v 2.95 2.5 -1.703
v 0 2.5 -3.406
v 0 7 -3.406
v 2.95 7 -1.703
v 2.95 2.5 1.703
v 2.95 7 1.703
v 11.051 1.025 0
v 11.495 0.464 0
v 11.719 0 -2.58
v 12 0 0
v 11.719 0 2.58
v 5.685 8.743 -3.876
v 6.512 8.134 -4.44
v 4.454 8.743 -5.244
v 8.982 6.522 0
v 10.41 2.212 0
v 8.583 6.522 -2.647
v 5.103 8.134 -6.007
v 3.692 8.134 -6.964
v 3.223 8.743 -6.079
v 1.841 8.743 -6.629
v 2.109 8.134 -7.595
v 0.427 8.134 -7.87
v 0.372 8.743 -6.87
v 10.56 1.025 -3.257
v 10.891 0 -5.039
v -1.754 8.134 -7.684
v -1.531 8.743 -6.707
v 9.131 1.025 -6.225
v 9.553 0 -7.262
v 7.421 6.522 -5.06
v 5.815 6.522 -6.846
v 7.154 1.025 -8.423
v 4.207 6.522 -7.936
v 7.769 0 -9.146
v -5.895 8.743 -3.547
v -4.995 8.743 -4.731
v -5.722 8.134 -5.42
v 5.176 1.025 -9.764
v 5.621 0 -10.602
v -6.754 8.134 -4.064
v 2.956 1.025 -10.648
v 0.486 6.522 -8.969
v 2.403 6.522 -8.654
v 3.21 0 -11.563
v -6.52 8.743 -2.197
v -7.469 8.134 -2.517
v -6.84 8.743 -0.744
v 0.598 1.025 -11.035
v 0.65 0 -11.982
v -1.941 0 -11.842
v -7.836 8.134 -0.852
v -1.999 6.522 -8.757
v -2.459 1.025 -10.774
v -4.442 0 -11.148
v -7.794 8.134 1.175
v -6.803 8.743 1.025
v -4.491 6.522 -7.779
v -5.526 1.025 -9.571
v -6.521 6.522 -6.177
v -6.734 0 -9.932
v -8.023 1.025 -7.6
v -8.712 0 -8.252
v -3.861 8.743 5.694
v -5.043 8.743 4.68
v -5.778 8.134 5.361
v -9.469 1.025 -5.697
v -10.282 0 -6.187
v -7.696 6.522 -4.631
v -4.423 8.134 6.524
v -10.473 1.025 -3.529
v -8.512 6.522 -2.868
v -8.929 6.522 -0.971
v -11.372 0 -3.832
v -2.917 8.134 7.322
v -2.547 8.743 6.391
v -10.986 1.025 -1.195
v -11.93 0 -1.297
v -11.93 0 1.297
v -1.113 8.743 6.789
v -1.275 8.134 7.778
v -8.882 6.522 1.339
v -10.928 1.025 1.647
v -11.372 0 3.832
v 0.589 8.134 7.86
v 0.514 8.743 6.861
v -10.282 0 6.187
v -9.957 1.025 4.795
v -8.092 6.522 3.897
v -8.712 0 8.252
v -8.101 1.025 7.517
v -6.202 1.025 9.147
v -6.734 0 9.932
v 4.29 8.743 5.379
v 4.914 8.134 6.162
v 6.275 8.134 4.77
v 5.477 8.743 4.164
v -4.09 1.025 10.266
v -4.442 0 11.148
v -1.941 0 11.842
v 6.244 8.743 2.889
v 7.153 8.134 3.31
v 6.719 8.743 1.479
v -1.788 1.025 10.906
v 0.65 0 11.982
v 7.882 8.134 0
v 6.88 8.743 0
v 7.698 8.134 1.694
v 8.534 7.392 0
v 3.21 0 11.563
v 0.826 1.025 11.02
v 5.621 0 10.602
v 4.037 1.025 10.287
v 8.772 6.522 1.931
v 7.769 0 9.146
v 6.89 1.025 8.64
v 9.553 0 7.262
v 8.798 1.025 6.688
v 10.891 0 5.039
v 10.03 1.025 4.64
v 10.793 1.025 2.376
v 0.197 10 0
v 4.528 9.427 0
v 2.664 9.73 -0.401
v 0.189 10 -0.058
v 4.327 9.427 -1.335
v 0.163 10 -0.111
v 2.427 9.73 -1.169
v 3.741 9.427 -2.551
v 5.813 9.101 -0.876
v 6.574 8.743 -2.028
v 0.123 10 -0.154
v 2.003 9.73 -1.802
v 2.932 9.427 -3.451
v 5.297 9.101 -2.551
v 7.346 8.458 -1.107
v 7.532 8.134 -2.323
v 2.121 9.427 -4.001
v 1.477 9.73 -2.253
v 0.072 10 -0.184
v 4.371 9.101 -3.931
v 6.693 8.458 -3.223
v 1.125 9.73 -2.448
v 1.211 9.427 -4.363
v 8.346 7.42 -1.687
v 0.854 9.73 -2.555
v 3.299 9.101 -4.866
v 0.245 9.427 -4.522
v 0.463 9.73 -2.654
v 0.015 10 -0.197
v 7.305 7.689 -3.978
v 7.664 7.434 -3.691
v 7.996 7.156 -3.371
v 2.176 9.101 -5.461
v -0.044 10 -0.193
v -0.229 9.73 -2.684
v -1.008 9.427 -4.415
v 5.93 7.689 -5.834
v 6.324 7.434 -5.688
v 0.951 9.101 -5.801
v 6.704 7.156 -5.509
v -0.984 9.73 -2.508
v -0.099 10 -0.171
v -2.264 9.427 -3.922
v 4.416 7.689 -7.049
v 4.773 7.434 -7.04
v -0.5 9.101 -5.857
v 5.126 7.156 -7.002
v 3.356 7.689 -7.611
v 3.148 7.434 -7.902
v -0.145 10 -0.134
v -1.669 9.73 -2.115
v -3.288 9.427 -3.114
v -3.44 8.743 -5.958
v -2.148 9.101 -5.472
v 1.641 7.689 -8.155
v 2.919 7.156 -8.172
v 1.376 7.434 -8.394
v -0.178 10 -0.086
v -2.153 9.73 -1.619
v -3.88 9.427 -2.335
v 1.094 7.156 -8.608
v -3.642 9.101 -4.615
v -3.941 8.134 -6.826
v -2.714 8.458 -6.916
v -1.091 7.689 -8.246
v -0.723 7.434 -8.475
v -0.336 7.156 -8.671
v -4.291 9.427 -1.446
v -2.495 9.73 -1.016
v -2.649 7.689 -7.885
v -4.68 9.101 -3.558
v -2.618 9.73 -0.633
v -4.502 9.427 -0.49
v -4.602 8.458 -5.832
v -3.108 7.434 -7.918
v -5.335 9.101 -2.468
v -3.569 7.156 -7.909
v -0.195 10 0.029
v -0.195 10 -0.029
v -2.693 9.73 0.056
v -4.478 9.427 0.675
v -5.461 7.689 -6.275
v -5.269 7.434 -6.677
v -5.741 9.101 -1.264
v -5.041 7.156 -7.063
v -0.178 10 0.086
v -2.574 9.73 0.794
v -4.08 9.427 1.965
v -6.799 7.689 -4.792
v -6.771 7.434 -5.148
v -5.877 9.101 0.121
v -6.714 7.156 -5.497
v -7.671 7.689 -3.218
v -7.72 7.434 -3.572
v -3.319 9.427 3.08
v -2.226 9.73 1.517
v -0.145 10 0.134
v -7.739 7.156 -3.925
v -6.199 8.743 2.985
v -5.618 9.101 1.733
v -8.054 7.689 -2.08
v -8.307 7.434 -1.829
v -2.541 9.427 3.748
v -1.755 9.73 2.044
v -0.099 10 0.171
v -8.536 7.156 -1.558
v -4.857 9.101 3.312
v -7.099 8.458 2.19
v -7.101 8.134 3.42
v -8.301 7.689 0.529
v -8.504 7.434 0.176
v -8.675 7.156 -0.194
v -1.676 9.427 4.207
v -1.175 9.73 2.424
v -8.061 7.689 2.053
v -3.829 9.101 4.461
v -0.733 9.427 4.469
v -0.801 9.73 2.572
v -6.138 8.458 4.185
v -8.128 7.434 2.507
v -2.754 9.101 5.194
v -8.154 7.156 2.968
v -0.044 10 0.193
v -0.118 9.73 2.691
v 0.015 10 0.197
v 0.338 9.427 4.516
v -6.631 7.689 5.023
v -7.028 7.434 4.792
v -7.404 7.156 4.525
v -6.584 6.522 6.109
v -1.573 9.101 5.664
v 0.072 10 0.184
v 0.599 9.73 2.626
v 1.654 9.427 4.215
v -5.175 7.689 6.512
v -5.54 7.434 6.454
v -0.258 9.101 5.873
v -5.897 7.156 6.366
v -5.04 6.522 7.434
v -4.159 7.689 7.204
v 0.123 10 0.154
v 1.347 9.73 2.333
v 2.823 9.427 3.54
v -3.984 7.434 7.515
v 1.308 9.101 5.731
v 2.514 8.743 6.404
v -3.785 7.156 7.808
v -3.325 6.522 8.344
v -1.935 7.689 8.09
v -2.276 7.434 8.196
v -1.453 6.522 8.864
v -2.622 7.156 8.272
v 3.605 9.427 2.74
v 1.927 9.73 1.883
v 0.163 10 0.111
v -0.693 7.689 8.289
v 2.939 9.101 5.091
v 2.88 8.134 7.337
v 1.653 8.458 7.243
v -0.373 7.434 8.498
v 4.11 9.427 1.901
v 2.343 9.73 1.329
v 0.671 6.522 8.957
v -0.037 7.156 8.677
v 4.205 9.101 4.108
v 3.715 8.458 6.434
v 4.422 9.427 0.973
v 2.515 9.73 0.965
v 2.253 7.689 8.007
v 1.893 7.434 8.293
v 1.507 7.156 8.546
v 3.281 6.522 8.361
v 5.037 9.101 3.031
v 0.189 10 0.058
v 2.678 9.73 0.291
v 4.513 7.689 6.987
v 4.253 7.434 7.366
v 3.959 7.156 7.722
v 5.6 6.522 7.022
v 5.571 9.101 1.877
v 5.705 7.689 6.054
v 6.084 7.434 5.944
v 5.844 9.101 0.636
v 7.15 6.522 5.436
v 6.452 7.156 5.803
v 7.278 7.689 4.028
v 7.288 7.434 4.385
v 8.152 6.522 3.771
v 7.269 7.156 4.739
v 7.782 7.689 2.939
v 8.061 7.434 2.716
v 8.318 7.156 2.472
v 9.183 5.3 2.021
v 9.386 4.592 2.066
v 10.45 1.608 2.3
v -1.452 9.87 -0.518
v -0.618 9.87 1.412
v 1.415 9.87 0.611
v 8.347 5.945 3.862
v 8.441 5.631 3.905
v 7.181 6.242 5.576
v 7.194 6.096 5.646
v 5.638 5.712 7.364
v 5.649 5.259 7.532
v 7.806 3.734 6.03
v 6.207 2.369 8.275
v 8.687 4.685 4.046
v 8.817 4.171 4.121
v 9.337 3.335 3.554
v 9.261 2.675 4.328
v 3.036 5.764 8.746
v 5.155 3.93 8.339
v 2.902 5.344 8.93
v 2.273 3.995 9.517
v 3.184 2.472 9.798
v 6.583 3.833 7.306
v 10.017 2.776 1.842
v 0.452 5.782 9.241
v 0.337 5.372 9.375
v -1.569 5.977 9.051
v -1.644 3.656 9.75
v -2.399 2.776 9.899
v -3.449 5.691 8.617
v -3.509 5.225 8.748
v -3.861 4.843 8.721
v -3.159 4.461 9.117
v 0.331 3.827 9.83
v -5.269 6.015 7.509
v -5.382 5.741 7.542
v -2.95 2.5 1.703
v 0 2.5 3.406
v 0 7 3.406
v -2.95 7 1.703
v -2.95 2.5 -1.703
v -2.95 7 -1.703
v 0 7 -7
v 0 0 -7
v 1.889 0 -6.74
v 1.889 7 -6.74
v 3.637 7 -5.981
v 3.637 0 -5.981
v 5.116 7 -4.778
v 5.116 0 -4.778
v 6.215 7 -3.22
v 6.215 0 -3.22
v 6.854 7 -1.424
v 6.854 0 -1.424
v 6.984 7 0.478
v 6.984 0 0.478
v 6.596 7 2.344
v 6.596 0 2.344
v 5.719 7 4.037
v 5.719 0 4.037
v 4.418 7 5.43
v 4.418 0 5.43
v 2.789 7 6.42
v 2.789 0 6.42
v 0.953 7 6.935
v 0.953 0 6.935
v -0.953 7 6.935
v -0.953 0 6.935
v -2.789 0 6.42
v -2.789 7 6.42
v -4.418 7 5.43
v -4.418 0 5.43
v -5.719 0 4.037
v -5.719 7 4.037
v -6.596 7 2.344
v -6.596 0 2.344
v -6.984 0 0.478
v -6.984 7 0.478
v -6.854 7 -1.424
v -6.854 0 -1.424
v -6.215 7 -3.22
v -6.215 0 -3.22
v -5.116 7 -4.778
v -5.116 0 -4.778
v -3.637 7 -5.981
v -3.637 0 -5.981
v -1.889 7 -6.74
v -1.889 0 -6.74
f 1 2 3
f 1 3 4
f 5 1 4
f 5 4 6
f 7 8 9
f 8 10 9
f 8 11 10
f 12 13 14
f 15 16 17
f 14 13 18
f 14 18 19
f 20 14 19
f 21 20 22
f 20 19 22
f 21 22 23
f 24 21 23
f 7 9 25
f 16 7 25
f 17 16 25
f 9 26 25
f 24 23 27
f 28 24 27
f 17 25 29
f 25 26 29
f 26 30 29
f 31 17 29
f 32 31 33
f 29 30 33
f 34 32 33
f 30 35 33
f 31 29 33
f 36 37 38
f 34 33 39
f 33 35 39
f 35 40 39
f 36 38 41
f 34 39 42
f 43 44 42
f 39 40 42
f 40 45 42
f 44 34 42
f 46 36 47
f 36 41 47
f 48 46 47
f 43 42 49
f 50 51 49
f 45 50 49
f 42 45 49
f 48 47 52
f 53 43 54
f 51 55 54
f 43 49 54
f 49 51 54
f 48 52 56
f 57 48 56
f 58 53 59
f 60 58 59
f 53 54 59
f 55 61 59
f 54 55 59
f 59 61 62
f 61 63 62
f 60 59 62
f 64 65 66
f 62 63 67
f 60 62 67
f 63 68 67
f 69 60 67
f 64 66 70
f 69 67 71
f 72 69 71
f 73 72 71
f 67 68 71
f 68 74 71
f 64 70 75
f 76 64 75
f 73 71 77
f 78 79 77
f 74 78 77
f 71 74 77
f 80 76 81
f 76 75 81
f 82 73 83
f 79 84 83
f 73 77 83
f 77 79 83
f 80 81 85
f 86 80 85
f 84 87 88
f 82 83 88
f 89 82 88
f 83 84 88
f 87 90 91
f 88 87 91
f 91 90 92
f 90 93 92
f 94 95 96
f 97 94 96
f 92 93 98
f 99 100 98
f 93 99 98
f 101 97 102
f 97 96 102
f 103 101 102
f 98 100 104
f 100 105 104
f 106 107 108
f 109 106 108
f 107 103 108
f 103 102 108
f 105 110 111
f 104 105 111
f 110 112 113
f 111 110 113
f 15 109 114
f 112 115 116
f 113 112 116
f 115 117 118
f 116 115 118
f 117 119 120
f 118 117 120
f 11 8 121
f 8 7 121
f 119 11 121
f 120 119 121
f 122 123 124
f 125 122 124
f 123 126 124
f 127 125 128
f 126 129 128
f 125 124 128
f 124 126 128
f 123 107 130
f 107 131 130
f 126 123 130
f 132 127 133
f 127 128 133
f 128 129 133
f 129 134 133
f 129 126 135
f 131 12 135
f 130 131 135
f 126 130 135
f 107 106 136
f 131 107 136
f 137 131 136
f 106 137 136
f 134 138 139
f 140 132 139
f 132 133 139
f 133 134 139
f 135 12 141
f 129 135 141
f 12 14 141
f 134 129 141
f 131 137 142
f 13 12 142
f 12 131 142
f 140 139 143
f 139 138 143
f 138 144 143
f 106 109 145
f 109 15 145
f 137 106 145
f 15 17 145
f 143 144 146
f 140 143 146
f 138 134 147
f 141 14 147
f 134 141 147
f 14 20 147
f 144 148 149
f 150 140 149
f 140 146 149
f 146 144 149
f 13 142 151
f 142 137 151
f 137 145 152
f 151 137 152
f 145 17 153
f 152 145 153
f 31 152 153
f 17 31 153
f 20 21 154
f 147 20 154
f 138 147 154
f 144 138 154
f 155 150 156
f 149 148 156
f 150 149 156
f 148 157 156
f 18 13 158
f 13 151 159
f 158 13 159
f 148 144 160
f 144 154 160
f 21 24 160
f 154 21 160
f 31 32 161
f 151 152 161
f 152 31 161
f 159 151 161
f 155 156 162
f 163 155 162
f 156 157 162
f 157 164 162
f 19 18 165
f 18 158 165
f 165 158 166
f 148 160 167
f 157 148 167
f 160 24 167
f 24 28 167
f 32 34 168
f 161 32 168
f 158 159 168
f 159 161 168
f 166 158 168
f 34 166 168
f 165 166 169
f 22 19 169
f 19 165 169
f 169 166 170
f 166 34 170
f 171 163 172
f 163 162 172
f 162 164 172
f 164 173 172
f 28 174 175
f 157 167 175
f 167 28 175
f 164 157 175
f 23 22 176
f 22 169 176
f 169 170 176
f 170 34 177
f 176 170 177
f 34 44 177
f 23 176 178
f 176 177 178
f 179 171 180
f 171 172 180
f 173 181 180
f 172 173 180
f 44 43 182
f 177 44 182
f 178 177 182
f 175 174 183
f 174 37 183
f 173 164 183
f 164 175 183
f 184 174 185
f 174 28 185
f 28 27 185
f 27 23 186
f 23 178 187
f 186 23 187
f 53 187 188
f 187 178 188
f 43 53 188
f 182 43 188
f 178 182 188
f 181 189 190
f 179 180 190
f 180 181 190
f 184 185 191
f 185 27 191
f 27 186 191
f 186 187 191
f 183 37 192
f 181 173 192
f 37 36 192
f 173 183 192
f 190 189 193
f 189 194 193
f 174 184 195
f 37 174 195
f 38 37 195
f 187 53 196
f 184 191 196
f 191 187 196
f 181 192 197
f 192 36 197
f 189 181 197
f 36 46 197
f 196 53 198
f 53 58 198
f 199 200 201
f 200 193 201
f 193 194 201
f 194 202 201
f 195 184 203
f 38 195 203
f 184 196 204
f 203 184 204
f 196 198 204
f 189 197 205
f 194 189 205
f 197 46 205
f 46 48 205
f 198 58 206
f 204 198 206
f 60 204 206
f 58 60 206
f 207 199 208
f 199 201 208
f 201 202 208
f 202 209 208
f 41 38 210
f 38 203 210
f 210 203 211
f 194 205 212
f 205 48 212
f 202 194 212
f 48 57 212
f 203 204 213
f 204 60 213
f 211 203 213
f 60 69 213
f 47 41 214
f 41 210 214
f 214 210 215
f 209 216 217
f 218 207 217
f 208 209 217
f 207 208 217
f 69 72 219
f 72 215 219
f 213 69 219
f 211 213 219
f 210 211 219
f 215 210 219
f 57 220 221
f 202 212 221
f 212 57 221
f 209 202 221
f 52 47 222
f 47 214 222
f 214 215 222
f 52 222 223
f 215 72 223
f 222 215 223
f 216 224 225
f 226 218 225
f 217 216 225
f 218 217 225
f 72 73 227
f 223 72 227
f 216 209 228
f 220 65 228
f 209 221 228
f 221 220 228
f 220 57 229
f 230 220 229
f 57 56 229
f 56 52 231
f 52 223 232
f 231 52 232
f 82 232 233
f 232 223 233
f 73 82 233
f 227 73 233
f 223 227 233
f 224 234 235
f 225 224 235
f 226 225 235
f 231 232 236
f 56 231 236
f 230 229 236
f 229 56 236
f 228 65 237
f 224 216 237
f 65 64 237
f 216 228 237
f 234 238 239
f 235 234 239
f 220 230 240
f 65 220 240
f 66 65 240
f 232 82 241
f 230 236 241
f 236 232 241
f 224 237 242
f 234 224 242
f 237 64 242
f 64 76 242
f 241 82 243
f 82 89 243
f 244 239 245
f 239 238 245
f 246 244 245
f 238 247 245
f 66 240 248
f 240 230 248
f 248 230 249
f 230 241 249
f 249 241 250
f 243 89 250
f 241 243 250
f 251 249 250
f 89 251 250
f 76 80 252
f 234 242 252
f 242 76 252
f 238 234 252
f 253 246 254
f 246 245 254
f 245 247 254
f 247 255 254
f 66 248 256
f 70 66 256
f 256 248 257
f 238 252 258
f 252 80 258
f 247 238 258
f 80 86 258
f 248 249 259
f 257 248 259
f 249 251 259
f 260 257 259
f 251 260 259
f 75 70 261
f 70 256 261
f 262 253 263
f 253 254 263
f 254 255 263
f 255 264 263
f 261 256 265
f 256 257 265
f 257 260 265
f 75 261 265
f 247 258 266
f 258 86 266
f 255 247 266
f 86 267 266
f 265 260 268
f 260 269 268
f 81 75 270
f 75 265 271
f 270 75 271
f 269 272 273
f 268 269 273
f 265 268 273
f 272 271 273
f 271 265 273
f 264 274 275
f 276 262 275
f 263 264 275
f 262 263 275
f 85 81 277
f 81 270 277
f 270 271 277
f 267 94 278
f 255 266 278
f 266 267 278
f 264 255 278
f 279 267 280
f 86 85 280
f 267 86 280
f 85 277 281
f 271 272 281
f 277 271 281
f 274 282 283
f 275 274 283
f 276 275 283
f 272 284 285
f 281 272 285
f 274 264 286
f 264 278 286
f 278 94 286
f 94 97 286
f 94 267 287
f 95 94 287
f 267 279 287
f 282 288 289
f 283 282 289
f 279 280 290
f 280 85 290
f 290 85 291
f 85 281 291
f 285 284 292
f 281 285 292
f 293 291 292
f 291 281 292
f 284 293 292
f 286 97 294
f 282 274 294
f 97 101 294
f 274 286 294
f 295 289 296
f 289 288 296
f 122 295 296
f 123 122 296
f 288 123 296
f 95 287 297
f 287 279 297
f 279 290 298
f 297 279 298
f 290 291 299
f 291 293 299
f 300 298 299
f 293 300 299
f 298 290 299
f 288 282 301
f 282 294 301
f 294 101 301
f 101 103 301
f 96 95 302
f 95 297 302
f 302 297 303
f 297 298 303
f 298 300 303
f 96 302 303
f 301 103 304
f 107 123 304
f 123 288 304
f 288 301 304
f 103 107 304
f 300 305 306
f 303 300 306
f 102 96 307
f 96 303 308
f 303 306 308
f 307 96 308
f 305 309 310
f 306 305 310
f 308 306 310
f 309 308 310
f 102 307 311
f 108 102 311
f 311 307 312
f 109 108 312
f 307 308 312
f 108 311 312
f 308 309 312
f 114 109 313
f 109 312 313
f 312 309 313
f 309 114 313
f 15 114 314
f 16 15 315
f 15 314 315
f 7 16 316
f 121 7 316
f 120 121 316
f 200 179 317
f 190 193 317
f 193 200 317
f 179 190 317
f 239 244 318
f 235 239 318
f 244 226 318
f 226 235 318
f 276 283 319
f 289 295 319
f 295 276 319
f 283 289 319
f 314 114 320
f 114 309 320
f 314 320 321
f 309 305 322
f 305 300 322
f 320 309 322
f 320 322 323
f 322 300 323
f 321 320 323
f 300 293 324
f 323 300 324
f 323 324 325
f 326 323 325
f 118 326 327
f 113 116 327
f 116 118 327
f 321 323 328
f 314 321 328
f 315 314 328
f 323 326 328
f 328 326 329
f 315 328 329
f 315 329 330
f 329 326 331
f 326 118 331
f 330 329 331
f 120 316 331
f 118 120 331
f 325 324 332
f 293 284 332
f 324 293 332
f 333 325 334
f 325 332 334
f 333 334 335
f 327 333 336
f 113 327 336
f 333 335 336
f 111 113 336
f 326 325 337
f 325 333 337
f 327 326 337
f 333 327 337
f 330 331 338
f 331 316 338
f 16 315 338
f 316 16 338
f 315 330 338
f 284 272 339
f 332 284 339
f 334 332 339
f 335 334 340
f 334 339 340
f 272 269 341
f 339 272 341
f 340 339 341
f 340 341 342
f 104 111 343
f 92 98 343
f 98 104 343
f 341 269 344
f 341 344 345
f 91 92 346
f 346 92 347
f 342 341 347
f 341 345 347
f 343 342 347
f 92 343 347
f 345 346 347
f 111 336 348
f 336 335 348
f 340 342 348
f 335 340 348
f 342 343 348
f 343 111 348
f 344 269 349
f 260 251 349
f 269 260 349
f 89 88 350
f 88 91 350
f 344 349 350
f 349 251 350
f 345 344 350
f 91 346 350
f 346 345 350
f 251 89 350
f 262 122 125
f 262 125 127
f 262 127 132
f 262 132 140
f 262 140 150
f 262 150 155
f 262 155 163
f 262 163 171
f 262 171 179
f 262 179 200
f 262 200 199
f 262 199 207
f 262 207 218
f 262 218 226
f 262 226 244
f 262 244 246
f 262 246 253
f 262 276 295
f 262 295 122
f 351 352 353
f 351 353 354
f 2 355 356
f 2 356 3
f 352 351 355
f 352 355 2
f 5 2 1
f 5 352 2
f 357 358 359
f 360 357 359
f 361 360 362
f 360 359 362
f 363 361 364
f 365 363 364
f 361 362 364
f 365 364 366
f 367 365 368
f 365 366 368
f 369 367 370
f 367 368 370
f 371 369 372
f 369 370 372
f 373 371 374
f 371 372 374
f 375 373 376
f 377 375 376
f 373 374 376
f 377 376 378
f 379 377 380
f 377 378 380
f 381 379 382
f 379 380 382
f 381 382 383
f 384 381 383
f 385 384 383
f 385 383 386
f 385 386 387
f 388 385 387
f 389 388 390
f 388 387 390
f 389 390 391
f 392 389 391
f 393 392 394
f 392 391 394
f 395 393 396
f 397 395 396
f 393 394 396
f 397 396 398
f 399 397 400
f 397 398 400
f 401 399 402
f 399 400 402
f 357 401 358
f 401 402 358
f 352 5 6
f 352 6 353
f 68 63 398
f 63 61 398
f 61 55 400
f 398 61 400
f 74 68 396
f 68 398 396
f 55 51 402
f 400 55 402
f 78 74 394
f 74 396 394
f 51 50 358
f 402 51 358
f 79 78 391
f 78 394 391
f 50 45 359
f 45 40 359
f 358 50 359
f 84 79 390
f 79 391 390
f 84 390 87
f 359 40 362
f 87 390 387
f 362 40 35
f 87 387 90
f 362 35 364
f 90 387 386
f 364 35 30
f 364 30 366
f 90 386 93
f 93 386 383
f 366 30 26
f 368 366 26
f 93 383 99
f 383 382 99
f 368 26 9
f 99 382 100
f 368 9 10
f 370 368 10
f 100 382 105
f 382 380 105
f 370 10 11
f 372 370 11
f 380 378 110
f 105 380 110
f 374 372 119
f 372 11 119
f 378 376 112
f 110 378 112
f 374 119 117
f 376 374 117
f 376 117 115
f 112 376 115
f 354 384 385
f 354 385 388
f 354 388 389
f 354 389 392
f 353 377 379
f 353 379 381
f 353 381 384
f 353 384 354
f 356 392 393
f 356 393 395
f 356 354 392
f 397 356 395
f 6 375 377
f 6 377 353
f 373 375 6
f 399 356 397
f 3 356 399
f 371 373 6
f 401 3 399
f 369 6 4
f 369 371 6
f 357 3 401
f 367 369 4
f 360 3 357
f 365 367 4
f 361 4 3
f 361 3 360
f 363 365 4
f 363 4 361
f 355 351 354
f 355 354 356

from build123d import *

# Parameters (mm, degrees)
SKETCH1_R           = 12
BOSS_EXTRUDE1_DEPTH = 10
SKETCH2_R           = 7
CUT_EXTRUDE1_DEPTH  = 7
SKETCH3_R           = 4.558249482
CUT_EXTRUDE2_DEPTH  = 2.5


# Read off the part's stored shape, not the designer's step: Cut-Revolve7
with BuildPart() as part:
    # Sketch1 → Boss-Extrude1 (new body)
    with BuildSketch(Plane(origin=(0, 0, 0), x_dir=(1, 0, 0), z_dir=(0, 1, 0))):
        with Locations(Location((0, 0, 0), (0, 0, 270))):
            Circle(SKETCH1_R)
    extrude(amount=BOSS_EXTRUDE1_DEPTH)

    # Sketch2 → Cut-Extrude1 (cut)
    with BuildSketch(Plane.XZ):
        with Locations(Location((0, 0, 0), (0, 0, 270))):
            Circle(SKETCH2_R)
        Polygon((2.95, -1.703183294), (2.95, 1.703183294), (0, 3.406366588), (-2.95, 1.703183294), (-2.95, -1.703183294), (0, -3.406366588), align=None, mode=Mode.SUBTRACT)
    extrude(amount=-CUT_EXTRUDE1_DEPTH, mode=Mode.SUBTRACT)

    # Sketch3 → Cut-Extrude2 (cut)
    with BuildSketch(Plane.XZ):
        Circle(SKETCH3_R)
    extrude(amount=-CUT_EXTRUDE2_DEPTH, mode=Mode.SUBTRACT)

    # Cut-Revolve7 outline → Cut-Revolve7 (revolve, cut)
    with BuildSketch(Plane.XY):
        with BuildLine():
            Line((12, 10), (0.197481425, 10))
            add(Edge.make_bspline(
                [(0.197481425, 10), (8.149812734, 9.330049938), (7.76948814, 8.0260799), (10.078601748, 8.379238452), (8.747465668, 2.511373283), (12, 0)],
                knots=[0, 0, 0, 0, 0, 0, 1, 1, 1, 1, 1, 1], degree=5))
            Line((12, 0), (12, 10))
        make_face()
    revolve(axis=Axis((0, 0, 0), (0, 1, 0)), mode=Mode.SUBTRACT)


solid = part.part
